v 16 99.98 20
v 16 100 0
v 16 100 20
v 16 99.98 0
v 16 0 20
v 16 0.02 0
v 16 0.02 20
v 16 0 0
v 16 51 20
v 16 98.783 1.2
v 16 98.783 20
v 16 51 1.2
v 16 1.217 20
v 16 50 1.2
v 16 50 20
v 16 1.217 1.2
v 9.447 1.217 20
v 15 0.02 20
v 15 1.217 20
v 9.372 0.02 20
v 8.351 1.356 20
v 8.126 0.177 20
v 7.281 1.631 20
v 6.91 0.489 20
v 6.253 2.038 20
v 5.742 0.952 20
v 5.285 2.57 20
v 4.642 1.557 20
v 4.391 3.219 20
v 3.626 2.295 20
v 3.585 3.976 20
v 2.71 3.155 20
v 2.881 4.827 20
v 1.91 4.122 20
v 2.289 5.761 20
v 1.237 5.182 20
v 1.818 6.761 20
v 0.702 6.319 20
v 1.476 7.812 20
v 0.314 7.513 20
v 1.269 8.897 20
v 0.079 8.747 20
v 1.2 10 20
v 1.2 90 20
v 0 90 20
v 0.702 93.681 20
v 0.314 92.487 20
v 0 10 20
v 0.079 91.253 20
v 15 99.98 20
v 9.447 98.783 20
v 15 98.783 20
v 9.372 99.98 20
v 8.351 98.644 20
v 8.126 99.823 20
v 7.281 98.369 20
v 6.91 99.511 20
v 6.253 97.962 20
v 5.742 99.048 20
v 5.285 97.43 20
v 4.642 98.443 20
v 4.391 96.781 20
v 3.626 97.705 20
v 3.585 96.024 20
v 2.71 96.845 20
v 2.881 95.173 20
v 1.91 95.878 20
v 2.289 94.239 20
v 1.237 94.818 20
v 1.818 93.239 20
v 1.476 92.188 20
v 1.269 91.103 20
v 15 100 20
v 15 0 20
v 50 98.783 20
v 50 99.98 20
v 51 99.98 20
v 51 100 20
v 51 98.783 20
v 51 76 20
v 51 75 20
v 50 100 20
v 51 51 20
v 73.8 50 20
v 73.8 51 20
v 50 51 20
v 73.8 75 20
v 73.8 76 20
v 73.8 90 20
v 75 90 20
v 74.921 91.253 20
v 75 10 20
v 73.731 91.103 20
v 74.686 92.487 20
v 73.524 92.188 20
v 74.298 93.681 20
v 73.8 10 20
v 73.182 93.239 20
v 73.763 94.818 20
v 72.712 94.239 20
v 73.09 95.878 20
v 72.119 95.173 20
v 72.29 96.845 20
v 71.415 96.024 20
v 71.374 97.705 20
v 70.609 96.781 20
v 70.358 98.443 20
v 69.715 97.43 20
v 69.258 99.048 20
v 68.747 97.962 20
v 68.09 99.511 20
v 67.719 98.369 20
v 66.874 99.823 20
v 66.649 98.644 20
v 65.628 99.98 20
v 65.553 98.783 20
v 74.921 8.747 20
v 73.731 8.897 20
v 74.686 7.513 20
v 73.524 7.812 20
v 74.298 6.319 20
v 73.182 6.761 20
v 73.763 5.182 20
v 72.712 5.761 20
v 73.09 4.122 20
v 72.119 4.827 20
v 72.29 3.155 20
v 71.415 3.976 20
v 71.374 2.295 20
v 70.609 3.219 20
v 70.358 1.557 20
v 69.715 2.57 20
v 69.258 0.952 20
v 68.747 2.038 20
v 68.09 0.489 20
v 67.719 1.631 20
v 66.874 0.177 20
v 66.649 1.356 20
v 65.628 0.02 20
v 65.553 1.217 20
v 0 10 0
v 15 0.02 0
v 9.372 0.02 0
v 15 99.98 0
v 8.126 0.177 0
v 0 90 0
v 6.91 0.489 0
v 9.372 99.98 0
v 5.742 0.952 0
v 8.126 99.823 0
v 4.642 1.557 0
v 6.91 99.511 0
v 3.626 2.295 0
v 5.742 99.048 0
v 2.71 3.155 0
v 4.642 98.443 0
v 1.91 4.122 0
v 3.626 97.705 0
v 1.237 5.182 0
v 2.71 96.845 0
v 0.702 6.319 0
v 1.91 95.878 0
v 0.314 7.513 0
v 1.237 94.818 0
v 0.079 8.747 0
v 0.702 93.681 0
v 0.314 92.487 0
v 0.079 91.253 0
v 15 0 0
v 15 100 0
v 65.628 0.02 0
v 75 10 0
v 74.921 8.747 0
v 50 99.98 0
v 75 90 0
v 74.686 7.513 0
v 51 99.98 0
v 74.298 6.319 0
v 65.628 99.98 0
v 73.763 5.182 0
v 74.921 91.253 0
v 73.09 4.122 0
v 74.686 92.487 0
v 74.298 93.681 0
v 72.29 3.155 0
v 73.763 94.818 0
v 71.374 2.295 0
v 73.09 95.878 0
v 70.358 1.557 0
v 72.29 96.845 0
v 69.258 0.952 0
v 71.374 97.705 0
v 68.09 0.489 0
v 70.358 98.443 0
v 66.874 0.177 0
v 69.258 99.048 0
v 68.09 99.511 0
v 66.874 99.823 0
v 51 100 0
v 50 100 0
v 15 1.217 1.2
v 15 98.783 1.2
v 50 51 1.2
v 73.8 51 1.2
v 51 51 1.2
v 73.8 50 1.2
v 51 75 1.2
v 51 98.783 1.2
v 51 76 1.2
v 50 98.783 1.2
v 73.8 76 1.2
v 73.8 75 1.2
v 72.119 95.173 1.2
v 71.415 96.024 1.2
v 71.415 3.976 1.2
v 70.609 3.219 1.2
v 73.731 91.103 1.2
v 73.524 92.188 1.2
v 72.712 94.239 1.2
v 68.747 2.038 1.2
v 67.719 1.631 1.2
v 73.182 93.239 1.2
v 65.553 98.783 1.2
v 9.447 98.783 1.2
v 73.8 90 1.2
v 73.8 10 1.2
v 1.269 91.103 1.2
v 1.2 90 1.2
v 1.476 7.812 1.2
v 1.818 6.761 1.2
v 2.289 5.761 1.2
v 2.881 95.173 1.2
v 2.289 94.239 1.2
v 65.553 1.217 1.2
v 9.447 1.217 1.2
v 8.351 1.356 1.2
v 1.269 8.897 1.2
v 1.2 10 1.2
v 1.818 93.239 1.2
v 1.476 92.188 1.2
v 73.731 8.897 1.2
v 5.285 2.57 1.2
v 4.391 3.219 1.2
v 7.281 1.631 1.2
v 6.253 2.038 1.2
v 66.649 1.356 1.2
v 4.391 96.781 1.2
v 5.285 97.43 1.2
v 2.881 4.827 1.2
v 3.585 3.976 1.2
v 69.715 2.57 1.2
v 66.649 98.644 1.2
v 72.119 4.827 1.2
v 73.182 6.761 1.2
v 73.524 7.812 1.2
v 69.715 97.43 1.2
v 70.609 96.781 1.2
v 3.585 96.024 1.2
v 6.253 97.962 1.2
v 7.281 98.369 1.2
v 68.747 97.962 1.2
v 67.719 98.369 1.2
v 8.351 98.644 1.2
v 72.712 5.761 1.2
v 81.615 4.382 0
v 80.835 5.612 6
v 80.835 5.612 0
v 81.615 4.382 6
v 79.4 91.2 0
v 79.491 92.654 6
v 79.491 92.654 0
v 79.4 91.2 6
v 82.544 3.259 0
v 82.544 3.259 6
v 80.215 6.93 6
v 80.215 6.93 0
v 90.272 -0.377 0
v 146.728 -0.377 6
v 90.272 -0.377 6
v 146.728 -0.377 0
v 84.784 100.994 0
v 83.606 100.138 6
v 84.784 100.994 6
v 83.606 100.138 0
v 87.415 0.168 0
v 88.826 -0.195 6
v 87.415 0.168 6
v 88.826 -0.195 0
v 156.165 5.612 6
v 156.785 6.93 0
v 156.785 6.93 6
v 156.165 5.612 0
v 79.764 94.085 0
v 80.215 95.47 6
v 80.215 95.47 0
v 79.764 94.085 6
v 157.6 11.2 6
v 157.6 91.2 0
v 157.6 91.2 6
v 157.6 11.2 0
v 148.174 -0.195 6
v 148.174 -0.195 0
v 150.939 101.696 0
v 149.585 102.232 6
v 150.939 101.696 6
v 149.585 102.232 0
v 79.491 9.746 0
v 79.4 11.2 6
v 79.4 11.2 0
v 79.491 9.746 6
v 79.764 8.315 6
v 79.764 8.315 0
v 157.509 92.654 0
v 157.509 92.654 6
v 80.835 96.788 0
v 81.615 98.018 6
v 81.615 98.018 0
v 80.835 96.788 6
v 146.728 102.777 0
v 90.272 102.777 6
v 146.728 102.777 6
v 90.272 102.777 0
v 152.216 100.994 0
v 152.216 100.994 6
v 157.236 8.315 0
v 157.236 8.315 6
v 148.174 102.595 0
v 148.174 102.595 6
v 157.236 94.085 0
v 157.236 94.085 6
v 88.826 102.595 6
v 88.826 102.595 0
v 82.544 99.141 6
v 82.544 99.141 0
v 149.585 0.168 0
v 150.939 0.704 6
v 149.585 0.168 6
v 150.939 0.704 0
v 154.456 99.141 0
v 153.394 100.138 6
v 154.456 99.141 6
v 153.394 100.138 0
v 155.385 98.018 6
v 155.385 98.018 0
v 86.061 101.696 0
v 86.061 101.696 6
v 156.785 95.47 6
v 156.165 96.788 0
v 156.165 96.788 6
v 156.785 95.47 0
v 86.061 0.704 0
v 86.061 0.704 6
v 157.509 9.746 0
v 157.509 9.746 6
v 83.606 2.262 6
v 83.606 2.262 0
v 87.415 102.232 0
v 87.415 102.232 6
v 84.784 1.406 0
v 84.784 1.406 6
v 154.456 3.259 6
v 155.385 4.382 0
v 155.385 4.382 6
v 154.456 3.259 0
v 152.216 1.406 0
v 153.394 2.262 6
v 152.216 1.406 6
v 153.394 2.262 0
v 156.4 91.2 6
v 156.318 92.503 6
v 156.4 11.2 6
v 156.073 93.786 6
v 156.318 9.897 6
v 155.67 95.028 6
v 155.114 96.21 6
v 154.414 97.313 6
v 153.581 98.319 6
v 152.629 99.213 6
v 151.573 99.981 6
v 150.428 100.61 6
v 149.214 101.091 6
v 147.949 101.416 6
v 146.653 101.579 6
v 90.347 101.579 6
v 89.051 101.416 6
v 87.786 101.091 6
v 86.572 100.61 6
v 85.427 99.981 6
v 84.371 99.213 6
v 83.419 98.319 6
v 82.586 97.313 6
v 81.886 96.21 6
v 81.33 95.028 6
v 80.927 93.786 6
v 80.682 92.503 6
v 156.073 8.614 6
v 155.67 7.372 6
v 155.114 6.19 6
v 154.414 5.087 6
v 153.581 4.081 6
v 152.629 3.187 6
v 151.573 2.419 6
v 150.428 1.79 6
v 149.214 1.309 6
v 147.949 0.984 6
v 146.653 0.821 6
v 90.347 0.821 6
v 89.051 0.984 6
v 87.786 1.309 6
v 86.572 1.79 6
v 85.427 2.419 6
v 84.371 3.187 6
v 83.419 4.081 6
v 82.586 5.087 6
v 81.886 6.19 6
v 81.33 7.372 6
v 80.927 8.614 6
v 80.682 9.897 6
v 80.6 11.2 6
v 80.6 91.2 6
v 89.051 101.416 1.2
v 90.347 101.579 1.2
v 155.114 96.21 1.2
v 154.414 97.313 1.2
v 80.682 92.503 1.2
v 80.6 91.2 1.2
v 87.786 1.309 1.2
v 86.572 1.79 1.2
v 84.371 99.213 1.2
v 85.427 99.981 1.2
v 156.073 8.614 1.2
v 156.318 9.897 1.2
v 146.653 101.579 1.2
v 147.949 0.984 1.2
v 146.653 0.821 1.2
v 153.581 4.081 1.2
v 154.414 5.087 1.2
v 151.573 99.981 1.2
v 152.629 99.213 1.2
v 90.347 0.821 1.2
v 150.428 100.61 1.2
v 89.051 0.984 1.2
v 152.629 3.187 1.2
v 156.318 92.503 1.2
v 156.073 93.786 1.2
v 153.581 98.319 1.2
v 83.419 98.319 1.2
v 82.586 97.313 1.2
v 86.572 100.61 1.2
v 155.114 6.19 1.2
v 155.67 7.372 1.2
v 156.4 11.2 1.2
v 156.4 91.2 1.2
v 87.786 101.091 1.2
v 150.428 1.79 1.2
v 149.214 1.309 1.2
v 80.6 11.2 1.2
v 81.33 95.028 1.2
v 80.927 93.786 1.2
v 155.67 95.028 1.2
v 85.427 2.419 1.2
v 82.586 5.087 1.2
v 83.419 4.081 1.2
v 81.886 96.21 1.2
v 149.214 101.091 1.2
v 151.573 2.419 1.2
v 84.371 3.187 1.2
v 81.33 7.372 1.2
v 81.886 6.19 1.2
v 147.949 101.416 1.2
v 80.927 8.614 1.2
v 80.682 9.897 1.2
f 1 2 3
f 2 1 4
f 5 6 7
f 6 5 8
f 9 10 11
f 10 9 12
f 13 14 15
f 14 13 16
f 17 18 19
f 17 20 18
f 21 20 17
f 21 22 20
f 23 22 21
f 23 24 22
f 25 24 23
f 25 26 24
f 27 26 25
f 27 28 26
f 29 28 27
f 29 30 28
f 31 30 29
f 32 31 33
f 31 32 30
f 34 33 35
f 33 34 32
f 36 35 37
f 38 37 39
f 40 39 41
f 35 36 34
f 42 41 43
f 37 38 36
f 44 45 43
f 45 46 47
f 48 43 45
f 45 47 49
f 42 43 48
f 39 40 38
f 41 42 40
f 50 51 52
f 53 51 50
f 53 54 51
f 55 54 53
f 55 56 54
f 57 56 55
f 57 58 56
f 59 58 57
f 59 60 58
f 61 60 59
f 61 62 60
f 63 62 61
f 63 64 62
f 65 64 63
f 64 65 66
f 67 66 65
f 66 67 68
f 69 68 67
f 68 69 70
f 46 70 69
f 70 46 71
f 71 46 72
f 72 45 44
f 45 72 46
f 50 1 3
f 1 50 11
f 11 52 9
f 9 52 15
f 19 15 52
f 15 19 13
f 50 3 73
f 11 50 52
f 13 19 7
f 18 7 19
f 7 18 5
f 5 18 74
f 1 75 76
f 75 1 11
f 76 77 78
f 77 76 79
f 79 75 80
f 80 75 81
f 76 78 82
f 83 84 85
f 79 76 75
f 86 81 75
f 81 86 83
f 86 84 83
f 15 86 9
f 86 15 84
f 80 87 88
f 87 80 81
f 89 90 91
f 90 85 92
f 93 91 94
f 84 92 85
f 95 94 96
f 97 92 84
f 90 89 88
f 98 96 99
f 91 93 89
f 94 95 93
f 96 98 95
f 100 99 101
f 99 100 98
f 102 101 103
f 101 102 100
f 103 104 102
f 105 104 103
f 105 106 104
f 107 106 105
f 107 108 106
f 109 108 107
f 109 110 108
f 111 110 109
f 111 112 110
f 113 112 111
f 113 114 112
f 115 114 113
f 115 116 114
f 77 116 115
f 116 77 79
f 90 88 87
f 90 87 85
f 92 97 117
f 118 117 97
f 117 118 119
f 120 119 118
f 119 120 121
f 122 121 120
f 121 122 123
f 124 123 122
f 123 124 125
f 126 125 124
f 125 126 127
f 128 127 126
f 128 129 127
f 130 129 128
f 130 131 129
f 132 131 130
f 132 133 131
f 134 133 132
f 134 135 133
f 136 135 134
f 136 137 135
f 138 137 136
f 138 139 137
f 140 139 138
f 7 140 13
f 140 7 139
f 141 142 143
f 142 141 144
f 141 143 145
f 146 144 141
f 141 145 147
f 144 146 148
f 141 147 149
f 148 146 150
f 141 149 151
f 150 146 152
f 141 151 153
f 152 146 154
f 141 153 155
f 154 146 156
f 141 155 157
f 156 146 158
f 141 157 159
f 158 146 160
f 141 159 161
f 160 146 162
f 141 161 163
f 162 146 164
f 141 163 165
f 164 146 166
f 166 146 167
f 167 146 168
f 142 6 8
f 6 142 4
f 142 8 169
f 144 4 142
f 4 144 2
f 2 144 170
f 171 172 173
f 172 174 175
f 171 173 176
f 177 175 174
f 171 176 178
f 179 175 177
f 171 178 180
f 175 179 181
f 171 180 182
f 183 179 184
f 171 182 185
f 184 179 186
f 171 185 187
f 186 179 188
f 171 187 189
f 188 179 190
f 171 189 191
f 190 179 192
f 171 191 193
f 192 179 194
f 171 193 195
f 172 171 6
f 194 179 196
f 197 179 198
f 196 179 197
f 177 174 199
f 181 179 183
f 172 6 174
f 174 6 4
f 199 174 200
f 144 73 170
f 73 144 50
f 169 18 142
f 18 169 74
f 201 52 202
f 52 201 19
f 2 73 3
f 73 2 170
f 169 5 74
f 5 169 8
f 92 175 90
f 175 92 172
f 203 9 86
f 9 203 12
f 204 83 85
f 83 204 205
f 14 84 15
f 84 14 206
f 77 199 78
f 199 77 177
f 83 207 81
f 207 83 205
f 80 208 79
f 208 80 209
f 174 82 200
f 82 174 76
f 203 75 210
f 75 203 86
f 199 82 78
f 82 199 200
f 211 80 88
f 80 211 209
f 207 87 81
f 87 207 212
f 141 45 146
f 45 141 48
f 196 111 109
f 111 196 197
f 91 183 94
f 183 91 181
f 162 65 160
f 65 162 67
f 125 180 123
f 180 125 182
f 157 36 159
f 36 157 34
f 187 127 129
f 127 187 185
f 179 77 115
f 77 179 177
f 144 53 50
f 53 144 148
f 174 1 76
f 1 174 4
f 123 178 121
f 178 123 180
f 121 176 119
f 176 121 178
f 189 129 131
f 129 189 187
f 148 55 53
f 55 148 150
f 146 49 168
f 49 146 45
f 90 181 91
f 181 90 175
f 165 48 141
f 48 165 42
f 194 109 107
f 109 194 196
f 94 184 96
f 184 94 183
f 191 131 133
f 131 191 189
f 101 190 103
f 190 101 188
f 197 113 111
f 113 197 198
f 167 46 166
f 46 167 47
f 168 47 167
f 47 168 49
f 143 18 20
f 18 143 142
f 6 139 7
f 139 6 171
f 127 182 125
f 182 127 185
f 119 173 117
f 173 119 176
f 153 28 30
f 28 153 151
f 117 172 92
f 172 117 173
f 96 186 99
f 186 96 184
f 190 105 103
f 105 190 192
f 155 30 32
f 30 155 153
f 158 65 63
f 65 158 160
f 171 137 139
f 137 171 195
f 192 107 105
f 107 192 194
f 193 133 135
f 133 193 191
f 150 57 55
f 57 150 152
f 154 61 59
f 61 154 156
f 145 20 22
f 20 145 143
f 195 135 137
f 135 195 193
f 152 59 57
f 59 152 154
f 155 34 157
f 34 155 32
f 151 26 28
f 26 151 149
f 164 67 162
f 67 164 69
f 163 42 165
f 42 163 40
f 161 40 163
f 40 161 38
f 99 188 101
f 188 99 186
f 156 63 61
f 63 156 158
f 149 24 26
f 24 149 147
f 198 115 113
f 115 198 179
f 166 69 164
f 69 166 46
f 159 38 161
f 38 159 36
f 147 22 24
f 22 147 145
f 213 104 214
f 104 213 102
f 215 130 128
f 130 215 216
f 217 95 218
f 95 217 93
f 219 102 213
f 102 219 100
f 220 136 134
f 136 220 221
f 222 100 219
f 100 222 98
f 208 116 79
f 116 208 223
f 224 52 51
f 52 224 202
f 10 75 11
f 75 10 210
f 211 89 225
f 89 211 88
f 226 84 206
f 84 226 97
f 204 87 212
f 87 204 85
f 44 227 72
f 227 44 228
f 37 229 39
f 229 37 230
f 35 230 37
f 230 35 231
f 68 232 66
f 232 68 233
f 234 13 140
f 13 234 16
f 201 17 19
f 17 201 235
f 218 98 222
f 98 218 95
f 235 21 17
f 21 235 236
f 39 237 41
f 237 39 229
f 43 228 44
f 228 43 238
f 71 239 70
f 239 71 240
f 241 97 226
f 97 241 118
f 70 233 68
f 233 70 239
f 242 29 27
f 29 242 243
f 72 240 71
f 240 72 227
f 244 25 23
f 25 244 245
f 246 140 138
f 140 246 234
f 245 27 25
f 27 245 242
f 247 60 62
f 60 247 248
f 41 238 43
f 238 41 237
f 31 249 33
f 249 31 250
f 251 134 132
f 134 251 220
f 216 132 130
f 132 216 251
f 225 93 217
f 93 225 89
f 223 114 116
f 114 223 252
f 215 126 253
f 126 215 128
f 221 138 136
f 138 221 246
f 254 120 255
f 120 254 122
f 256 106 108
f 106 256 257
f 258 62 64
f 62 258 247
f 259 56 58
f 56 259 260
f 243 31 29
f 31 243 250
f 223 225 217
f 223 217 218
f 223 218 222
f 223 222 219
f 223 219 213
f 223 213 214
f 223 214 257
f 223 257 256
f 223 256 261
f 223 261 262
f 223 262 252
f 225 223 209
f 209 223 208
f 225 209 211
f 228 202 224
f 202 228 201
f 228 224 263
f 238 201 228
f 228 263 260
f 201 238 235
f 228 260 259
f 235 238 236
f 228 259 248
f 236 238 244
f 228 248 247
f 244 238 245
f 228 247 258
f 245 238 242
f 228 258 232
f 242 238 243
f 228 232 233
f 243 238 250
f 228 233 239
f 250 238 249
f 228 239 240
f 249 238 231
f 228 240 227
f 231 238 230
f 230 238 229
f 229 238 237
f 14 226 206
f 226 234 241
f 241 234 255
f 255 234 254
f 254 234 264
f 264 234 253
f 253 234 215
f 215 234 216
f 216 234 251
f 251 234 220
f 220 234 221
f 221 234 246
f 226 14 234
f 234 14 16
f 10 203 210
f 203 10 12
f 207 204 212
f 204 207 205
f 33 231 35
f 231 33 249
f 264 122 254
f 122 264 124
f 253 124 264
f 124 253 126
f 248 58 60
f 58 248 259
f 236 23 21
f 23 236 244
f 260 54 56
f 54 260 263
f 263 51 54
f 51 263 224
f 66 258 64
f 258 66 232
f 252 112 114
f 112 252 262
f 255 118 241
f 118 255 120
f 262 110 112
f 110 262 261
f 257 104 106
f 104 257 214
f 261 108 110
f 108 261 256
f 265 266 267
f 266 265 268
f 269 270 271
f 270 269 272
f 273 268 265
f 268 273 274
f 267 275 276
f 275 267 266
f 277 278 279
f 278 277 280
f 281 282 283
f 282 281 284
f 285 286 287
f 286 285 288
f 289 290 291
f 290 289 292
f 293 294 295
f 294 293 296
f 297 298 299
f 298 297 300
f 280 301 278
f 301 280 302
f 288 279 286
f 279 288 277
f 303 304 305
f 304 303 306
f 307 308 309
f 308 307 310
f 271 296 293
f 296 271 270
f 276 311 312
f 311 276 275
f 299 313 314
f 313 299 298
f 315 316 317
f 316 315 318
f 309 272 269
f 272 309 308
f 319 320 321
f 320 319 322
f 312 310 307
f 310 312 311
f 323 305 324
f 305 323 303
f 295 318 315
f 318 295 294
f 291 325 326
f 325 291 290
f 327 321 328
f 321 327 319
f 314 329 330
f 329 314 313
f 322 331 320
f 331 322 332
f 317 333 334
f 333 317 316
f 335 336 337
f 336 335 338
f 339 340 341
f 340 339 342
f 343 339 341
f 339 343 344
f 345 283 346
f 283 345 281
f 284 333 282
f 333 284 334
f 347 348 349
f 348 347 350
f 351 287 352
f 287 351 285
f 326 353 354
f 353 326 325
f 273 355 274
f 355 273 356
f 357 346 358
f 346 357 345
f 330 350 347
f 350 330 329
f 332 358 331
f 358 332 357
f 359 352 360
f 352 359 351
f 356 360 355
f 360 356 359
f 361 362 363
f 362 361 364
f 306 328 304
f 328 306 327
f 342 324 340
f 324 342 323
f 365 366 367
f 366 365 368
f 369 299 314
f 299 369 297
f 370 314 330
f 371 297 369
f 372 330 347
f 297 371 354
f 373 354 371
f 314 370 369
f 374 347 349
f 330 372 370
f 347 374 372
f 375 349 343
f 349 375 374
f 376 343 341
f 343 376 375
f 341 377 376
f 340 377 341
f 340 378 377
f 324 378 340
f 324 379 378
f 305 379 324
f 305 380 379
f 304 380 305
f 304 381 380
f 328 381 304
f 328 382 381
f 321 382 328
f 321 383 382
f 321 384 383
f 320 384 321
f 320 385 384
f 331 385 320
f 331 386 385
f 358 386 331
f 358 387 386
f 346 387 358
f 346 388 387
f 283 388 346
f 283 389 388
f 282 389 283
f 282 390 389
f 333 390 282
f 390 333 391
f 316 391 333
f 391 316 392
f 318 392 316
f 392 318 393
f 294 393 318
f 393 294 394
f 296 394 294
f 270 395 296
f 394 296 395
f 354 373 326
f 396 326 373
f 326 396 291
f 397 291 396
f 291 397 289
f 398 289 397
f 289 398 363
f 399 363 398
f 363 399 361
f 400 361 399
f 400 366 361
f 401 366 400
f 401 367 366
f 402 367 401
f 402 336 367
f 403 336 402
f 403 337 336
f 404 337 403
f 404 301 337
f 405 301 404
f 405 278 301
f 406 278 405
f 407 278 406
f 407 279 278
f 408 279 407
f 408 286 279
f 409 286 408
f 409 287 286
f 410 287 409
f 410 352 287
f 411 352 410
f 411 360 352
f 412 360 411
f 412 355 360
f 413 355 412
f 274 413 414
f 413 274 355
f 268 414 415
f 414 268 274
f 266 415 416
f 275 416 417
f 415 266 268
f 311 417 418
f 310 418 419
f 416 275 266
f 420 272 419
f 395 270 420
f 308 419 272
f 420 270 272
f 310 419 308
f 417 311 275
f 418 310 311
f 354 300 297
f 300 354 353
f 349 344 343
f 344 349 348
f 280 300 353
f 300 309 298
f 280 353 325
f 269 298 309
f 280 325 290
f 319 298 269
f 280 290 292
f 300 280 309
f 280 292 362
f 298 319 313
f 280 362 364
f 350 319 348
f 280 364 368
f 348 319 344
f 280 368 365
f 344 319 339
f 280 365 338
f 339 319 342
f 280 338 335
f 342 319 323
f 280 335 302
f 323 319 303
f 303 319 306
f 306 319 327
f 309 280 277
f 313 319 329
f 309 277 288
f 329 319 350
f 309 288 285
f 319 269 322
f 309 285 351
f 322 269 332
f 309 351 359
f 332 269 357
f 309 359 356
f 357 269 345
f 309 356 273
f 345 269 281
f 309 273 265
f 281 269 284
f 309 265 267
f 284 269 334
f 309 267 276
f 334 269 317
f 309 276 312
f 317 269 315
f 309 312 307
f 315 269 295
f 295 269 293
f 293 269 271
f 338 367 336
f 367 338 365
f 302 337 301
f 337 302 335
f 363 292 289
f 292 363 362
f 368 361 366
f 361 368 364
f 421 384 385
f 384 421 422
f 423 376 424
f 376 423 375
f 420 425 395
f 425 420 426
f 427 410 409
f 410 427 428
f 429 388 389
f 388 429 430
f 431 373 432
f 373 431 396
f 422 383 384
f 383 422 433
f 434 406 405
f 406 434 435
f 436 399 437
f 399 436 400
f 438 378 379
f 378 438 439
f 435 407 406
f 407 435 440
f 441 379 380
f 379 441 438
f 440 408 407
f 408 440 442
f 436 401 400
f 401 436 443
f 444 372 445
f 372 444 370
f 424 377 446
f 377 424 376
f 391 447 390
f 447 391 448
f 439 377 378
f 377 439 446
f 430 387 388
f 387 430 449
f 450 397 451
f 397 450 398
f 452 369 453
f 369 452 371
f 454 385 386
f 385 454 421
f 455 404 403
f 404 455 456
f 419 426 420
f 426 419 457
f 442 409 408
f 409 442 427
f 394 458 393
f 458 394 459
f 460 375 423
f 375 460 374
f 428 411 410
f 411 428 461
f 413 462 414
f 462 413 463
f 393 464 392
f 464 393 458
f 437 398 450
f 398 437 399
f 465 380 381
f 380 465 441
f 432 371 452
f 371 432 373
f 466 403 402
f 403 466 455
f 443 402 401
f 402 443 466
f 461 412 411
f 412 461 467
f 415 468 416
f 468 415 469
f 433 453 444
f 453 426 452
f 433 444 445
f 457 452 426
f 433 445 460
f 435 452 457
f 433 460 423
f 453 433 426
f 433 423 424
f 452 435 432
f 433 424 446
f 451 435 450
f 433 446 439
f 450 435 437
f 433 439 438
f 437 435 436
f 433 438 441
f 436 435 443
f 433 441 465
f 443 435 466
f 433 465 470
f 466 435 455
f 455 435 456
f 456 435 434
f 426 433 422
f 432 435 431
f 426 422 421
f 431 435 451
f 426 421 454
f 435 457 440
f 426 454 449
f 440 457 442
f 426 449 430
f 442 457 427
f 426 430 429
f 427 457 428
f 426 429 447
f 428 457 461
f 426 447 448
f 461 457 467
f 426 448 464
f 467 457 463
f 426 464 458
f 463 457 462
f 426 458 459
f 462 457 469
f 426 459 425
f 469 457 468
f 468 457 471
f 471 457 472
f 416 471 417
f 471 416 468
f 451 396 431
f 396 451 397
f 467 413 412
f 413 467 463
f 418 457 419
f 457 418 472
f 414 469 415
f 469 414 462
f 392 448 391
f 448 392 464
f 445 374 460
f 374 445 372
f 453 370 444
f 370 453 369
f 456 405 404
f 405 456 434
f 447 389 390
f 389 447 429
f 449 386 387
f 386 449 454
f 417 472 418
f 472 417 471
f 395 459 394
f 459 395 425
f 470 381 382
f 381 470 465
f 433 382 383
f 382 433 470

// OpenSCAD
/* [Box] */
//Box height
height=20;
//Box length
length=100;
//Box width
width=75;
//Radius for corners (minimum 2)
cornerrad=10*1;
//Wall thickness
outwalls=1.2*1;
//Box thickness for floor
thickness=1.2;
//divider thickness
divider_thickness=1;

/* [Lid] */
//Tolerance for lid
tol=0.4*1; 
//Lid thickness for top
lidthickness=1.2;
//Lid height
lidheight=6;

//
/*[type of divider arrangement;]*/
type=4;

//////
if (type==1)
{   
/* [Box Sections1] */
//across long (Y)
 translate([.4*width,0,0])
    cube([divider_thickness,length,height]);
 //top big divider (X)
 translate([.4*width,1/2*length,0])
    cube([.6*width,divider_thickness,height]);
 //top small divider (Y)
 translate([1/2*length,1/2*length,0])
    cube([divider_thickness,1/2*length,height]); 
 //top small divider (X)
 translate([1/2*length,width,0])
    cube([1/4*length,divider_thickness,height]);
}
//////
if (type==2)
{
/* [Box Sections2] */
//across top left (Y)
 translate([.25*width,.5*length,0])
    cube([divider_thickness,.5*length,height]);
 // across long (X)
 translate([0,.5*length,0])
    cube([.5*length,divider_thickness,height]);
//across top right (Y)
 translate([.665*width,.5*length,0])
    cube([divider_thickness,.5*length,height]);
 //bottom big divider (Y)
 translate([.5*length,0,0])
    cube([divider_thickness,1/2*length,height]); 
 //bottom small divider (X)
 translate([0,.25*length,0])
    cube([1/2*length,divider_thickness,height]);
 //bottom small divider (Y)
 translate([0,.25*length,0])
    cube([divider_thickness,1/2*length,height]); 
}
/////////

if (type==3)
{
/* [Box Sections3] */
//across long (Y)
 translate([.4*width,0,0])
    cube([divider_thickness,length,height]);
 //top small divider (Y)
 translate([1/2*length,0,0])
    cube([divider_thickness,length,height]); 
 //top small divider (X)
 translate([.3*length,.35*width,0])
    cube([.43*length,divider_thickness,height]);
 //bottom small divider (X)
 translate([.3*length,width,0])
    cube([.43*length,divider_thickness,height]);
}
/////////

if (type==4)
{
/* [Box Sections4] */
//across long (Y)
 translate([.2*width,0,0])
    cube([divider_thickness,length,height]);
 //top big divider (X)
 translate([.2*width,1/2*length,0])
    cube([.8*width,divider_thickness,height]);
 //top small divider (Y)
 translate([1/2*length,1/2*length,0])
    cube([divider_thickness,1/2*length,height]); 
 //top small divider (X)
 translate([1/2*length,width,0])
    cube([.25*length,divider_thickness,height]);
}
/////


l=length-(cornerrad*2);
w=width-(cornerrad*2);

translate([cornerrad, cornerrad, 0]){
    union(){
        difference() {
            hull() {
                h = (height/2);
                translate([0,0,h]) cylinder(h=height, r=cornerrad, $fn=50, center = true);
                translate([0,l,h]) cylinder(h=height, r=cornerrad, $fn=50, center = true);
                translate([w,l,h]) cylinder(h=height, r=cornerrad, $fn=50, center = true);
                translate([w,0,h]) cylinder(h=height, r=cornerrad, $fn=50, center = true);
            }
            hull() {
                h = (height/2) + thickness;
                translate([0,0,h]) cylinder(h=height, r=cornerrad-outwalls, $fn=50, center = true);
                translate([0,l,h]) cylinder(h=height, r=cornerrad-outwalls, $fn=50, center = true);
                translate([w,l,h]) cylinder(h=height, r=cornerrad-outwalls, $fn=50, center = true);
                translate([w,0,h]) cylinder(h=height, r=cornerrad-outwalls, $fn=50, center = true);
            }
        }
      
  ///      if( sectionsl > 0 ){
  //          cutl = ((length) - (outwalls*2))/sectionsl;
  //          for(i = [cutl : cutl : length-cutl]) {
  //              translate([w/2,i+outwalls-cornerrad,sectionsh/2]) ///cube([width,inwalls,sectionsh], center=true);
     ///       }
    //    }
        
   //     if( sectionsw > 0 ){
   //         cutw = ((width) - (outwalls*2))/sectionsw;
    //        for(i = [cutw : cutw : width-cutw]) {
    //            translate([i+outwalls-cornerrad,l/2,sectionsh/2]) //cube([inwalls,length,sectionsh], center=true);
   //         }
    //    }
        
    }

    translate([w + (cornerrad*2) + 6, outwalls, 0]){
        difference() {
            hull() {
                h = (lidheight/2);
                translate([0,0,h]) cylinder(h=lidheight, r=cornerrad+tol+outwalls, $fn=50, center = true);
                translate([0,l,h]) cylinder(h=lidheight, r=cornerrad+tol+outwalls, $fn=50, center = true);
                translate([w,l,h]) cylinder(h=lidheight, r=cornerrad+tol+outwalls, $fn=50, center = true);
                translate([w,0,h]) cylinder(h=lidheight, r=cornerrad+tol+outwalls, $fn=50, center = true);
            }
            
            hull() {
                h = (lidheight/2) + lidthickness;
                translate([0,0,h]) cylinder(h=lidheight, r=(cornerrad)+tol, $fn=50, center = true);
                translate([0,l,h]) cylinder(h=lidheight, r=(cornerrad)+tol, $fn=50, center = true);
                translate([w,l,h]) cylinder(h=lidheight, r=(cornerrad)+tol, $fn=50, center = true);
                translate([w,0,h]) cylinder(h=lidheight, r=(cornerrad)+tol, $fn=50, center = true);
            }
        }
    }
}

 





 
